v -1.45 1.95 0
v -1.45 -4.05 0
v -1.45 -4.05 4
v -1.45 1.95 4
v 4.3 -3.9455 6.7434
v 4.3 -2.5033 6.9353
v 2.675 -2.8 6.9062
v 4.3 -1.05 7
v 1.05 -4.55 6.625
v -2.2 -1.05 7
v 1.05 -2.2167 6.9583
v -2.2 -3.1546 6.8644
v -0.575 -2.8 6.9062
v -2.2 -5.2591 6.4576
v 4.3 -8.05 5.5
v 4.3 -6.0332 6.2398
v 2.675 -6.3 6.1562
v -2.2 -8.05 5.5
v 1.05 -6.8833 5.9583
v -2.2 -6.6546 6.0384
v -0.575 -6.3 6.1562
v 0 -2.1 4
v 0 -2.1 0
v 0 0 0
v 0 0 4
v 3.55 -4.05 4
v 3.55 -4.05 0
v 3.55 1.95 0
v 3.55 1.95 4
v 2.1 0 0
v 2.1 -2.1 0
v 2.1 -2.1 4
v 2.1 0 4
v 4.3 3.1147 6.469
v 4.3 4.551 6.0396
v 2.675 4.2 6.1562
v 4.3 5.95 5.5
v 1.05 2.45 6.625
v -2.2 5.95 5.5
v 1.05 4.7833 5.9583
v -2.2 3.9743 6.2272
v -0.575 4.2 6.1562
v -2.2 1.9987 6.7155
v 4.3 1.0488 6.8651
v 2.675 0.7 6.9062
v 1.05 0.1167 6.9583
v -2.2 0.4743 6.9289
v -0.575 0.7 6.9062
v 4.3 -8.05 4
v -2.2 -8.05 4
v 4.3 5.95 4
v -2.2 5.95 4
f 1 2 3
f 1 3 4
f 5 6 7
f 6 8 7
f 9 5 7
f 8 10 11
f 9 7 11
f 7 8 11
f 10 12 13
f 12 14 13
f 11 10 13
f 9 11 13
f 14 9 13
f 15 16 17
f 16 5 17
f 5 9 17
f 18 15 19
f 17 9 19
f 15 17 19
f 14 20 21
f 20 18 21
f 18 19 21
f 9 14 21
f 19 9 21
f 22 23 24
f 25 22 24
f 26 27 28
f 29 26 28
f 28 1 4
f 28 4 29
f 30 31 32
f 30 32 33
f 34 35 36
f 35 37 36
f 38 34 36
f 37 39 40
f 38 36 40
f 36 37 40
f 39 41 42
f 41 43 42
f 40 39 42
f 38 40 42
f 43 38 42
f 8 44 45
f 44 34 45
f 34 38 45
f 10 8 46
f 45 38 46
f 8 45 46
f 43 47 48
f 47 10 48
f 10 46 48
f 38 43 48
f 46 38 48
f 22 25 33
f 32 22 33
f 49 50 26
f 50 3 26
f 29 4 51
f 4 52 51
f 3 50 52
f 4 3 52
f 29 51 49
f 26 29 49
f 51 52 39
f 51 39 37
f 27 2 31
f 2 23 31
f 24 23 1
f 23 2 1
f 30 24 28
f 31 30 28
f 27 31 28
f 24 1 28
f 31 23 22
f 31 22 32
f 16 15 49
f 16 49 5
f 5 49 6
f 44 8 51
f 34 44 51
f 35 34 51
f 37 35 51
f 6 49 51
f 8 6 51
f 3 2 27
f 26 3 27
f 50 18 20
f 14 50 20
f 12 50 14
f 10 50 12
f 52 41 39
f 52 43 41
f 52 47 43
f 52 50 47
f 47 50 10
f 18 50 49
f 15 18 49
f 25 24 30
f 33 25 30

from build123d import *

# Parameters (mm, degrees)
SZKIC1_W                    = 5
SZKIC1_H                    = 6
SZKIC1_W_2                  = 2.1
SZKIC1_H_2                  = 2.1
DODANIE_WYCI_GNI_CIE1_DEPTH = 4
SZKIC3_W                    = 6.5
SZKIC3_H                    = 14
DODANIE_WYCI_GNI_CIE2_DEPTH = 3
WYTNIJ_WYCI_GNI_CIE1_DEPTH  = 13.492097502


with BuildPart() as part:
    # Szkic1 → Dodanie-wyciągnięcie1 (new body)
    with BuildSketch(Plane.XY):
        with Locations((1.05, -1.05)):
            Rectangle(SZKIC1_W, SZKIC1_H)
        with Locations((1.05, -1.05)):
            Rectangle(SZKIC1_W_2, SZKIC1_H_2, mode=Mode.SUBTRACT)
    extrude(amount=DODANIE_WYCI_GNI_CIE1_DEPTH)

    # Szkic3 → Dodanie-wyciągnięcie2 (add)
    with BuildSketch(Plane.XY.offset(4)):
        with Locations((1.05, -1.05)):
            Rectangle(SZKIC3_W, SZKIC3_H)
    extrude(amount=DODANIE_WYCI_GNI_CIE2_DEPTH)

    # Szkic4 → Wytnij-wyciągnięcie1 (cut, through all)
    with BuildSketch(Plane.ZY.offset(2.2)):
        with BuildLine():
            Line((7, -8.05), (7, -1.05))
            add(Edge.make_bspline(
                [(7, -1.05), (7, -4.55), (5.5, -8.05)],
                knots=[0.5, 0.5, 0.5, 1, 1, 1], degree=2))
            Line((5.5, -8.05), (7, -8.05))
        make_face()
        with BuildLine():
            Line((7, 5.95), (5.5, 5.95))
            add(Edge.make_bspline(
                [(5.5, 5.95), (7, 2.45), (7, -1.05)],
                knots=[0, 0, 0, 0.5, 0.5, 0.5], degree=2))
            Line((7, -1.05), (7, 5.95))
        make_face()
    extrude(amount=-WYTNIJ_WYCI_GNI_CIE1_DEPTH, mode=Mode.SUBTRACT)


solid = part.part
